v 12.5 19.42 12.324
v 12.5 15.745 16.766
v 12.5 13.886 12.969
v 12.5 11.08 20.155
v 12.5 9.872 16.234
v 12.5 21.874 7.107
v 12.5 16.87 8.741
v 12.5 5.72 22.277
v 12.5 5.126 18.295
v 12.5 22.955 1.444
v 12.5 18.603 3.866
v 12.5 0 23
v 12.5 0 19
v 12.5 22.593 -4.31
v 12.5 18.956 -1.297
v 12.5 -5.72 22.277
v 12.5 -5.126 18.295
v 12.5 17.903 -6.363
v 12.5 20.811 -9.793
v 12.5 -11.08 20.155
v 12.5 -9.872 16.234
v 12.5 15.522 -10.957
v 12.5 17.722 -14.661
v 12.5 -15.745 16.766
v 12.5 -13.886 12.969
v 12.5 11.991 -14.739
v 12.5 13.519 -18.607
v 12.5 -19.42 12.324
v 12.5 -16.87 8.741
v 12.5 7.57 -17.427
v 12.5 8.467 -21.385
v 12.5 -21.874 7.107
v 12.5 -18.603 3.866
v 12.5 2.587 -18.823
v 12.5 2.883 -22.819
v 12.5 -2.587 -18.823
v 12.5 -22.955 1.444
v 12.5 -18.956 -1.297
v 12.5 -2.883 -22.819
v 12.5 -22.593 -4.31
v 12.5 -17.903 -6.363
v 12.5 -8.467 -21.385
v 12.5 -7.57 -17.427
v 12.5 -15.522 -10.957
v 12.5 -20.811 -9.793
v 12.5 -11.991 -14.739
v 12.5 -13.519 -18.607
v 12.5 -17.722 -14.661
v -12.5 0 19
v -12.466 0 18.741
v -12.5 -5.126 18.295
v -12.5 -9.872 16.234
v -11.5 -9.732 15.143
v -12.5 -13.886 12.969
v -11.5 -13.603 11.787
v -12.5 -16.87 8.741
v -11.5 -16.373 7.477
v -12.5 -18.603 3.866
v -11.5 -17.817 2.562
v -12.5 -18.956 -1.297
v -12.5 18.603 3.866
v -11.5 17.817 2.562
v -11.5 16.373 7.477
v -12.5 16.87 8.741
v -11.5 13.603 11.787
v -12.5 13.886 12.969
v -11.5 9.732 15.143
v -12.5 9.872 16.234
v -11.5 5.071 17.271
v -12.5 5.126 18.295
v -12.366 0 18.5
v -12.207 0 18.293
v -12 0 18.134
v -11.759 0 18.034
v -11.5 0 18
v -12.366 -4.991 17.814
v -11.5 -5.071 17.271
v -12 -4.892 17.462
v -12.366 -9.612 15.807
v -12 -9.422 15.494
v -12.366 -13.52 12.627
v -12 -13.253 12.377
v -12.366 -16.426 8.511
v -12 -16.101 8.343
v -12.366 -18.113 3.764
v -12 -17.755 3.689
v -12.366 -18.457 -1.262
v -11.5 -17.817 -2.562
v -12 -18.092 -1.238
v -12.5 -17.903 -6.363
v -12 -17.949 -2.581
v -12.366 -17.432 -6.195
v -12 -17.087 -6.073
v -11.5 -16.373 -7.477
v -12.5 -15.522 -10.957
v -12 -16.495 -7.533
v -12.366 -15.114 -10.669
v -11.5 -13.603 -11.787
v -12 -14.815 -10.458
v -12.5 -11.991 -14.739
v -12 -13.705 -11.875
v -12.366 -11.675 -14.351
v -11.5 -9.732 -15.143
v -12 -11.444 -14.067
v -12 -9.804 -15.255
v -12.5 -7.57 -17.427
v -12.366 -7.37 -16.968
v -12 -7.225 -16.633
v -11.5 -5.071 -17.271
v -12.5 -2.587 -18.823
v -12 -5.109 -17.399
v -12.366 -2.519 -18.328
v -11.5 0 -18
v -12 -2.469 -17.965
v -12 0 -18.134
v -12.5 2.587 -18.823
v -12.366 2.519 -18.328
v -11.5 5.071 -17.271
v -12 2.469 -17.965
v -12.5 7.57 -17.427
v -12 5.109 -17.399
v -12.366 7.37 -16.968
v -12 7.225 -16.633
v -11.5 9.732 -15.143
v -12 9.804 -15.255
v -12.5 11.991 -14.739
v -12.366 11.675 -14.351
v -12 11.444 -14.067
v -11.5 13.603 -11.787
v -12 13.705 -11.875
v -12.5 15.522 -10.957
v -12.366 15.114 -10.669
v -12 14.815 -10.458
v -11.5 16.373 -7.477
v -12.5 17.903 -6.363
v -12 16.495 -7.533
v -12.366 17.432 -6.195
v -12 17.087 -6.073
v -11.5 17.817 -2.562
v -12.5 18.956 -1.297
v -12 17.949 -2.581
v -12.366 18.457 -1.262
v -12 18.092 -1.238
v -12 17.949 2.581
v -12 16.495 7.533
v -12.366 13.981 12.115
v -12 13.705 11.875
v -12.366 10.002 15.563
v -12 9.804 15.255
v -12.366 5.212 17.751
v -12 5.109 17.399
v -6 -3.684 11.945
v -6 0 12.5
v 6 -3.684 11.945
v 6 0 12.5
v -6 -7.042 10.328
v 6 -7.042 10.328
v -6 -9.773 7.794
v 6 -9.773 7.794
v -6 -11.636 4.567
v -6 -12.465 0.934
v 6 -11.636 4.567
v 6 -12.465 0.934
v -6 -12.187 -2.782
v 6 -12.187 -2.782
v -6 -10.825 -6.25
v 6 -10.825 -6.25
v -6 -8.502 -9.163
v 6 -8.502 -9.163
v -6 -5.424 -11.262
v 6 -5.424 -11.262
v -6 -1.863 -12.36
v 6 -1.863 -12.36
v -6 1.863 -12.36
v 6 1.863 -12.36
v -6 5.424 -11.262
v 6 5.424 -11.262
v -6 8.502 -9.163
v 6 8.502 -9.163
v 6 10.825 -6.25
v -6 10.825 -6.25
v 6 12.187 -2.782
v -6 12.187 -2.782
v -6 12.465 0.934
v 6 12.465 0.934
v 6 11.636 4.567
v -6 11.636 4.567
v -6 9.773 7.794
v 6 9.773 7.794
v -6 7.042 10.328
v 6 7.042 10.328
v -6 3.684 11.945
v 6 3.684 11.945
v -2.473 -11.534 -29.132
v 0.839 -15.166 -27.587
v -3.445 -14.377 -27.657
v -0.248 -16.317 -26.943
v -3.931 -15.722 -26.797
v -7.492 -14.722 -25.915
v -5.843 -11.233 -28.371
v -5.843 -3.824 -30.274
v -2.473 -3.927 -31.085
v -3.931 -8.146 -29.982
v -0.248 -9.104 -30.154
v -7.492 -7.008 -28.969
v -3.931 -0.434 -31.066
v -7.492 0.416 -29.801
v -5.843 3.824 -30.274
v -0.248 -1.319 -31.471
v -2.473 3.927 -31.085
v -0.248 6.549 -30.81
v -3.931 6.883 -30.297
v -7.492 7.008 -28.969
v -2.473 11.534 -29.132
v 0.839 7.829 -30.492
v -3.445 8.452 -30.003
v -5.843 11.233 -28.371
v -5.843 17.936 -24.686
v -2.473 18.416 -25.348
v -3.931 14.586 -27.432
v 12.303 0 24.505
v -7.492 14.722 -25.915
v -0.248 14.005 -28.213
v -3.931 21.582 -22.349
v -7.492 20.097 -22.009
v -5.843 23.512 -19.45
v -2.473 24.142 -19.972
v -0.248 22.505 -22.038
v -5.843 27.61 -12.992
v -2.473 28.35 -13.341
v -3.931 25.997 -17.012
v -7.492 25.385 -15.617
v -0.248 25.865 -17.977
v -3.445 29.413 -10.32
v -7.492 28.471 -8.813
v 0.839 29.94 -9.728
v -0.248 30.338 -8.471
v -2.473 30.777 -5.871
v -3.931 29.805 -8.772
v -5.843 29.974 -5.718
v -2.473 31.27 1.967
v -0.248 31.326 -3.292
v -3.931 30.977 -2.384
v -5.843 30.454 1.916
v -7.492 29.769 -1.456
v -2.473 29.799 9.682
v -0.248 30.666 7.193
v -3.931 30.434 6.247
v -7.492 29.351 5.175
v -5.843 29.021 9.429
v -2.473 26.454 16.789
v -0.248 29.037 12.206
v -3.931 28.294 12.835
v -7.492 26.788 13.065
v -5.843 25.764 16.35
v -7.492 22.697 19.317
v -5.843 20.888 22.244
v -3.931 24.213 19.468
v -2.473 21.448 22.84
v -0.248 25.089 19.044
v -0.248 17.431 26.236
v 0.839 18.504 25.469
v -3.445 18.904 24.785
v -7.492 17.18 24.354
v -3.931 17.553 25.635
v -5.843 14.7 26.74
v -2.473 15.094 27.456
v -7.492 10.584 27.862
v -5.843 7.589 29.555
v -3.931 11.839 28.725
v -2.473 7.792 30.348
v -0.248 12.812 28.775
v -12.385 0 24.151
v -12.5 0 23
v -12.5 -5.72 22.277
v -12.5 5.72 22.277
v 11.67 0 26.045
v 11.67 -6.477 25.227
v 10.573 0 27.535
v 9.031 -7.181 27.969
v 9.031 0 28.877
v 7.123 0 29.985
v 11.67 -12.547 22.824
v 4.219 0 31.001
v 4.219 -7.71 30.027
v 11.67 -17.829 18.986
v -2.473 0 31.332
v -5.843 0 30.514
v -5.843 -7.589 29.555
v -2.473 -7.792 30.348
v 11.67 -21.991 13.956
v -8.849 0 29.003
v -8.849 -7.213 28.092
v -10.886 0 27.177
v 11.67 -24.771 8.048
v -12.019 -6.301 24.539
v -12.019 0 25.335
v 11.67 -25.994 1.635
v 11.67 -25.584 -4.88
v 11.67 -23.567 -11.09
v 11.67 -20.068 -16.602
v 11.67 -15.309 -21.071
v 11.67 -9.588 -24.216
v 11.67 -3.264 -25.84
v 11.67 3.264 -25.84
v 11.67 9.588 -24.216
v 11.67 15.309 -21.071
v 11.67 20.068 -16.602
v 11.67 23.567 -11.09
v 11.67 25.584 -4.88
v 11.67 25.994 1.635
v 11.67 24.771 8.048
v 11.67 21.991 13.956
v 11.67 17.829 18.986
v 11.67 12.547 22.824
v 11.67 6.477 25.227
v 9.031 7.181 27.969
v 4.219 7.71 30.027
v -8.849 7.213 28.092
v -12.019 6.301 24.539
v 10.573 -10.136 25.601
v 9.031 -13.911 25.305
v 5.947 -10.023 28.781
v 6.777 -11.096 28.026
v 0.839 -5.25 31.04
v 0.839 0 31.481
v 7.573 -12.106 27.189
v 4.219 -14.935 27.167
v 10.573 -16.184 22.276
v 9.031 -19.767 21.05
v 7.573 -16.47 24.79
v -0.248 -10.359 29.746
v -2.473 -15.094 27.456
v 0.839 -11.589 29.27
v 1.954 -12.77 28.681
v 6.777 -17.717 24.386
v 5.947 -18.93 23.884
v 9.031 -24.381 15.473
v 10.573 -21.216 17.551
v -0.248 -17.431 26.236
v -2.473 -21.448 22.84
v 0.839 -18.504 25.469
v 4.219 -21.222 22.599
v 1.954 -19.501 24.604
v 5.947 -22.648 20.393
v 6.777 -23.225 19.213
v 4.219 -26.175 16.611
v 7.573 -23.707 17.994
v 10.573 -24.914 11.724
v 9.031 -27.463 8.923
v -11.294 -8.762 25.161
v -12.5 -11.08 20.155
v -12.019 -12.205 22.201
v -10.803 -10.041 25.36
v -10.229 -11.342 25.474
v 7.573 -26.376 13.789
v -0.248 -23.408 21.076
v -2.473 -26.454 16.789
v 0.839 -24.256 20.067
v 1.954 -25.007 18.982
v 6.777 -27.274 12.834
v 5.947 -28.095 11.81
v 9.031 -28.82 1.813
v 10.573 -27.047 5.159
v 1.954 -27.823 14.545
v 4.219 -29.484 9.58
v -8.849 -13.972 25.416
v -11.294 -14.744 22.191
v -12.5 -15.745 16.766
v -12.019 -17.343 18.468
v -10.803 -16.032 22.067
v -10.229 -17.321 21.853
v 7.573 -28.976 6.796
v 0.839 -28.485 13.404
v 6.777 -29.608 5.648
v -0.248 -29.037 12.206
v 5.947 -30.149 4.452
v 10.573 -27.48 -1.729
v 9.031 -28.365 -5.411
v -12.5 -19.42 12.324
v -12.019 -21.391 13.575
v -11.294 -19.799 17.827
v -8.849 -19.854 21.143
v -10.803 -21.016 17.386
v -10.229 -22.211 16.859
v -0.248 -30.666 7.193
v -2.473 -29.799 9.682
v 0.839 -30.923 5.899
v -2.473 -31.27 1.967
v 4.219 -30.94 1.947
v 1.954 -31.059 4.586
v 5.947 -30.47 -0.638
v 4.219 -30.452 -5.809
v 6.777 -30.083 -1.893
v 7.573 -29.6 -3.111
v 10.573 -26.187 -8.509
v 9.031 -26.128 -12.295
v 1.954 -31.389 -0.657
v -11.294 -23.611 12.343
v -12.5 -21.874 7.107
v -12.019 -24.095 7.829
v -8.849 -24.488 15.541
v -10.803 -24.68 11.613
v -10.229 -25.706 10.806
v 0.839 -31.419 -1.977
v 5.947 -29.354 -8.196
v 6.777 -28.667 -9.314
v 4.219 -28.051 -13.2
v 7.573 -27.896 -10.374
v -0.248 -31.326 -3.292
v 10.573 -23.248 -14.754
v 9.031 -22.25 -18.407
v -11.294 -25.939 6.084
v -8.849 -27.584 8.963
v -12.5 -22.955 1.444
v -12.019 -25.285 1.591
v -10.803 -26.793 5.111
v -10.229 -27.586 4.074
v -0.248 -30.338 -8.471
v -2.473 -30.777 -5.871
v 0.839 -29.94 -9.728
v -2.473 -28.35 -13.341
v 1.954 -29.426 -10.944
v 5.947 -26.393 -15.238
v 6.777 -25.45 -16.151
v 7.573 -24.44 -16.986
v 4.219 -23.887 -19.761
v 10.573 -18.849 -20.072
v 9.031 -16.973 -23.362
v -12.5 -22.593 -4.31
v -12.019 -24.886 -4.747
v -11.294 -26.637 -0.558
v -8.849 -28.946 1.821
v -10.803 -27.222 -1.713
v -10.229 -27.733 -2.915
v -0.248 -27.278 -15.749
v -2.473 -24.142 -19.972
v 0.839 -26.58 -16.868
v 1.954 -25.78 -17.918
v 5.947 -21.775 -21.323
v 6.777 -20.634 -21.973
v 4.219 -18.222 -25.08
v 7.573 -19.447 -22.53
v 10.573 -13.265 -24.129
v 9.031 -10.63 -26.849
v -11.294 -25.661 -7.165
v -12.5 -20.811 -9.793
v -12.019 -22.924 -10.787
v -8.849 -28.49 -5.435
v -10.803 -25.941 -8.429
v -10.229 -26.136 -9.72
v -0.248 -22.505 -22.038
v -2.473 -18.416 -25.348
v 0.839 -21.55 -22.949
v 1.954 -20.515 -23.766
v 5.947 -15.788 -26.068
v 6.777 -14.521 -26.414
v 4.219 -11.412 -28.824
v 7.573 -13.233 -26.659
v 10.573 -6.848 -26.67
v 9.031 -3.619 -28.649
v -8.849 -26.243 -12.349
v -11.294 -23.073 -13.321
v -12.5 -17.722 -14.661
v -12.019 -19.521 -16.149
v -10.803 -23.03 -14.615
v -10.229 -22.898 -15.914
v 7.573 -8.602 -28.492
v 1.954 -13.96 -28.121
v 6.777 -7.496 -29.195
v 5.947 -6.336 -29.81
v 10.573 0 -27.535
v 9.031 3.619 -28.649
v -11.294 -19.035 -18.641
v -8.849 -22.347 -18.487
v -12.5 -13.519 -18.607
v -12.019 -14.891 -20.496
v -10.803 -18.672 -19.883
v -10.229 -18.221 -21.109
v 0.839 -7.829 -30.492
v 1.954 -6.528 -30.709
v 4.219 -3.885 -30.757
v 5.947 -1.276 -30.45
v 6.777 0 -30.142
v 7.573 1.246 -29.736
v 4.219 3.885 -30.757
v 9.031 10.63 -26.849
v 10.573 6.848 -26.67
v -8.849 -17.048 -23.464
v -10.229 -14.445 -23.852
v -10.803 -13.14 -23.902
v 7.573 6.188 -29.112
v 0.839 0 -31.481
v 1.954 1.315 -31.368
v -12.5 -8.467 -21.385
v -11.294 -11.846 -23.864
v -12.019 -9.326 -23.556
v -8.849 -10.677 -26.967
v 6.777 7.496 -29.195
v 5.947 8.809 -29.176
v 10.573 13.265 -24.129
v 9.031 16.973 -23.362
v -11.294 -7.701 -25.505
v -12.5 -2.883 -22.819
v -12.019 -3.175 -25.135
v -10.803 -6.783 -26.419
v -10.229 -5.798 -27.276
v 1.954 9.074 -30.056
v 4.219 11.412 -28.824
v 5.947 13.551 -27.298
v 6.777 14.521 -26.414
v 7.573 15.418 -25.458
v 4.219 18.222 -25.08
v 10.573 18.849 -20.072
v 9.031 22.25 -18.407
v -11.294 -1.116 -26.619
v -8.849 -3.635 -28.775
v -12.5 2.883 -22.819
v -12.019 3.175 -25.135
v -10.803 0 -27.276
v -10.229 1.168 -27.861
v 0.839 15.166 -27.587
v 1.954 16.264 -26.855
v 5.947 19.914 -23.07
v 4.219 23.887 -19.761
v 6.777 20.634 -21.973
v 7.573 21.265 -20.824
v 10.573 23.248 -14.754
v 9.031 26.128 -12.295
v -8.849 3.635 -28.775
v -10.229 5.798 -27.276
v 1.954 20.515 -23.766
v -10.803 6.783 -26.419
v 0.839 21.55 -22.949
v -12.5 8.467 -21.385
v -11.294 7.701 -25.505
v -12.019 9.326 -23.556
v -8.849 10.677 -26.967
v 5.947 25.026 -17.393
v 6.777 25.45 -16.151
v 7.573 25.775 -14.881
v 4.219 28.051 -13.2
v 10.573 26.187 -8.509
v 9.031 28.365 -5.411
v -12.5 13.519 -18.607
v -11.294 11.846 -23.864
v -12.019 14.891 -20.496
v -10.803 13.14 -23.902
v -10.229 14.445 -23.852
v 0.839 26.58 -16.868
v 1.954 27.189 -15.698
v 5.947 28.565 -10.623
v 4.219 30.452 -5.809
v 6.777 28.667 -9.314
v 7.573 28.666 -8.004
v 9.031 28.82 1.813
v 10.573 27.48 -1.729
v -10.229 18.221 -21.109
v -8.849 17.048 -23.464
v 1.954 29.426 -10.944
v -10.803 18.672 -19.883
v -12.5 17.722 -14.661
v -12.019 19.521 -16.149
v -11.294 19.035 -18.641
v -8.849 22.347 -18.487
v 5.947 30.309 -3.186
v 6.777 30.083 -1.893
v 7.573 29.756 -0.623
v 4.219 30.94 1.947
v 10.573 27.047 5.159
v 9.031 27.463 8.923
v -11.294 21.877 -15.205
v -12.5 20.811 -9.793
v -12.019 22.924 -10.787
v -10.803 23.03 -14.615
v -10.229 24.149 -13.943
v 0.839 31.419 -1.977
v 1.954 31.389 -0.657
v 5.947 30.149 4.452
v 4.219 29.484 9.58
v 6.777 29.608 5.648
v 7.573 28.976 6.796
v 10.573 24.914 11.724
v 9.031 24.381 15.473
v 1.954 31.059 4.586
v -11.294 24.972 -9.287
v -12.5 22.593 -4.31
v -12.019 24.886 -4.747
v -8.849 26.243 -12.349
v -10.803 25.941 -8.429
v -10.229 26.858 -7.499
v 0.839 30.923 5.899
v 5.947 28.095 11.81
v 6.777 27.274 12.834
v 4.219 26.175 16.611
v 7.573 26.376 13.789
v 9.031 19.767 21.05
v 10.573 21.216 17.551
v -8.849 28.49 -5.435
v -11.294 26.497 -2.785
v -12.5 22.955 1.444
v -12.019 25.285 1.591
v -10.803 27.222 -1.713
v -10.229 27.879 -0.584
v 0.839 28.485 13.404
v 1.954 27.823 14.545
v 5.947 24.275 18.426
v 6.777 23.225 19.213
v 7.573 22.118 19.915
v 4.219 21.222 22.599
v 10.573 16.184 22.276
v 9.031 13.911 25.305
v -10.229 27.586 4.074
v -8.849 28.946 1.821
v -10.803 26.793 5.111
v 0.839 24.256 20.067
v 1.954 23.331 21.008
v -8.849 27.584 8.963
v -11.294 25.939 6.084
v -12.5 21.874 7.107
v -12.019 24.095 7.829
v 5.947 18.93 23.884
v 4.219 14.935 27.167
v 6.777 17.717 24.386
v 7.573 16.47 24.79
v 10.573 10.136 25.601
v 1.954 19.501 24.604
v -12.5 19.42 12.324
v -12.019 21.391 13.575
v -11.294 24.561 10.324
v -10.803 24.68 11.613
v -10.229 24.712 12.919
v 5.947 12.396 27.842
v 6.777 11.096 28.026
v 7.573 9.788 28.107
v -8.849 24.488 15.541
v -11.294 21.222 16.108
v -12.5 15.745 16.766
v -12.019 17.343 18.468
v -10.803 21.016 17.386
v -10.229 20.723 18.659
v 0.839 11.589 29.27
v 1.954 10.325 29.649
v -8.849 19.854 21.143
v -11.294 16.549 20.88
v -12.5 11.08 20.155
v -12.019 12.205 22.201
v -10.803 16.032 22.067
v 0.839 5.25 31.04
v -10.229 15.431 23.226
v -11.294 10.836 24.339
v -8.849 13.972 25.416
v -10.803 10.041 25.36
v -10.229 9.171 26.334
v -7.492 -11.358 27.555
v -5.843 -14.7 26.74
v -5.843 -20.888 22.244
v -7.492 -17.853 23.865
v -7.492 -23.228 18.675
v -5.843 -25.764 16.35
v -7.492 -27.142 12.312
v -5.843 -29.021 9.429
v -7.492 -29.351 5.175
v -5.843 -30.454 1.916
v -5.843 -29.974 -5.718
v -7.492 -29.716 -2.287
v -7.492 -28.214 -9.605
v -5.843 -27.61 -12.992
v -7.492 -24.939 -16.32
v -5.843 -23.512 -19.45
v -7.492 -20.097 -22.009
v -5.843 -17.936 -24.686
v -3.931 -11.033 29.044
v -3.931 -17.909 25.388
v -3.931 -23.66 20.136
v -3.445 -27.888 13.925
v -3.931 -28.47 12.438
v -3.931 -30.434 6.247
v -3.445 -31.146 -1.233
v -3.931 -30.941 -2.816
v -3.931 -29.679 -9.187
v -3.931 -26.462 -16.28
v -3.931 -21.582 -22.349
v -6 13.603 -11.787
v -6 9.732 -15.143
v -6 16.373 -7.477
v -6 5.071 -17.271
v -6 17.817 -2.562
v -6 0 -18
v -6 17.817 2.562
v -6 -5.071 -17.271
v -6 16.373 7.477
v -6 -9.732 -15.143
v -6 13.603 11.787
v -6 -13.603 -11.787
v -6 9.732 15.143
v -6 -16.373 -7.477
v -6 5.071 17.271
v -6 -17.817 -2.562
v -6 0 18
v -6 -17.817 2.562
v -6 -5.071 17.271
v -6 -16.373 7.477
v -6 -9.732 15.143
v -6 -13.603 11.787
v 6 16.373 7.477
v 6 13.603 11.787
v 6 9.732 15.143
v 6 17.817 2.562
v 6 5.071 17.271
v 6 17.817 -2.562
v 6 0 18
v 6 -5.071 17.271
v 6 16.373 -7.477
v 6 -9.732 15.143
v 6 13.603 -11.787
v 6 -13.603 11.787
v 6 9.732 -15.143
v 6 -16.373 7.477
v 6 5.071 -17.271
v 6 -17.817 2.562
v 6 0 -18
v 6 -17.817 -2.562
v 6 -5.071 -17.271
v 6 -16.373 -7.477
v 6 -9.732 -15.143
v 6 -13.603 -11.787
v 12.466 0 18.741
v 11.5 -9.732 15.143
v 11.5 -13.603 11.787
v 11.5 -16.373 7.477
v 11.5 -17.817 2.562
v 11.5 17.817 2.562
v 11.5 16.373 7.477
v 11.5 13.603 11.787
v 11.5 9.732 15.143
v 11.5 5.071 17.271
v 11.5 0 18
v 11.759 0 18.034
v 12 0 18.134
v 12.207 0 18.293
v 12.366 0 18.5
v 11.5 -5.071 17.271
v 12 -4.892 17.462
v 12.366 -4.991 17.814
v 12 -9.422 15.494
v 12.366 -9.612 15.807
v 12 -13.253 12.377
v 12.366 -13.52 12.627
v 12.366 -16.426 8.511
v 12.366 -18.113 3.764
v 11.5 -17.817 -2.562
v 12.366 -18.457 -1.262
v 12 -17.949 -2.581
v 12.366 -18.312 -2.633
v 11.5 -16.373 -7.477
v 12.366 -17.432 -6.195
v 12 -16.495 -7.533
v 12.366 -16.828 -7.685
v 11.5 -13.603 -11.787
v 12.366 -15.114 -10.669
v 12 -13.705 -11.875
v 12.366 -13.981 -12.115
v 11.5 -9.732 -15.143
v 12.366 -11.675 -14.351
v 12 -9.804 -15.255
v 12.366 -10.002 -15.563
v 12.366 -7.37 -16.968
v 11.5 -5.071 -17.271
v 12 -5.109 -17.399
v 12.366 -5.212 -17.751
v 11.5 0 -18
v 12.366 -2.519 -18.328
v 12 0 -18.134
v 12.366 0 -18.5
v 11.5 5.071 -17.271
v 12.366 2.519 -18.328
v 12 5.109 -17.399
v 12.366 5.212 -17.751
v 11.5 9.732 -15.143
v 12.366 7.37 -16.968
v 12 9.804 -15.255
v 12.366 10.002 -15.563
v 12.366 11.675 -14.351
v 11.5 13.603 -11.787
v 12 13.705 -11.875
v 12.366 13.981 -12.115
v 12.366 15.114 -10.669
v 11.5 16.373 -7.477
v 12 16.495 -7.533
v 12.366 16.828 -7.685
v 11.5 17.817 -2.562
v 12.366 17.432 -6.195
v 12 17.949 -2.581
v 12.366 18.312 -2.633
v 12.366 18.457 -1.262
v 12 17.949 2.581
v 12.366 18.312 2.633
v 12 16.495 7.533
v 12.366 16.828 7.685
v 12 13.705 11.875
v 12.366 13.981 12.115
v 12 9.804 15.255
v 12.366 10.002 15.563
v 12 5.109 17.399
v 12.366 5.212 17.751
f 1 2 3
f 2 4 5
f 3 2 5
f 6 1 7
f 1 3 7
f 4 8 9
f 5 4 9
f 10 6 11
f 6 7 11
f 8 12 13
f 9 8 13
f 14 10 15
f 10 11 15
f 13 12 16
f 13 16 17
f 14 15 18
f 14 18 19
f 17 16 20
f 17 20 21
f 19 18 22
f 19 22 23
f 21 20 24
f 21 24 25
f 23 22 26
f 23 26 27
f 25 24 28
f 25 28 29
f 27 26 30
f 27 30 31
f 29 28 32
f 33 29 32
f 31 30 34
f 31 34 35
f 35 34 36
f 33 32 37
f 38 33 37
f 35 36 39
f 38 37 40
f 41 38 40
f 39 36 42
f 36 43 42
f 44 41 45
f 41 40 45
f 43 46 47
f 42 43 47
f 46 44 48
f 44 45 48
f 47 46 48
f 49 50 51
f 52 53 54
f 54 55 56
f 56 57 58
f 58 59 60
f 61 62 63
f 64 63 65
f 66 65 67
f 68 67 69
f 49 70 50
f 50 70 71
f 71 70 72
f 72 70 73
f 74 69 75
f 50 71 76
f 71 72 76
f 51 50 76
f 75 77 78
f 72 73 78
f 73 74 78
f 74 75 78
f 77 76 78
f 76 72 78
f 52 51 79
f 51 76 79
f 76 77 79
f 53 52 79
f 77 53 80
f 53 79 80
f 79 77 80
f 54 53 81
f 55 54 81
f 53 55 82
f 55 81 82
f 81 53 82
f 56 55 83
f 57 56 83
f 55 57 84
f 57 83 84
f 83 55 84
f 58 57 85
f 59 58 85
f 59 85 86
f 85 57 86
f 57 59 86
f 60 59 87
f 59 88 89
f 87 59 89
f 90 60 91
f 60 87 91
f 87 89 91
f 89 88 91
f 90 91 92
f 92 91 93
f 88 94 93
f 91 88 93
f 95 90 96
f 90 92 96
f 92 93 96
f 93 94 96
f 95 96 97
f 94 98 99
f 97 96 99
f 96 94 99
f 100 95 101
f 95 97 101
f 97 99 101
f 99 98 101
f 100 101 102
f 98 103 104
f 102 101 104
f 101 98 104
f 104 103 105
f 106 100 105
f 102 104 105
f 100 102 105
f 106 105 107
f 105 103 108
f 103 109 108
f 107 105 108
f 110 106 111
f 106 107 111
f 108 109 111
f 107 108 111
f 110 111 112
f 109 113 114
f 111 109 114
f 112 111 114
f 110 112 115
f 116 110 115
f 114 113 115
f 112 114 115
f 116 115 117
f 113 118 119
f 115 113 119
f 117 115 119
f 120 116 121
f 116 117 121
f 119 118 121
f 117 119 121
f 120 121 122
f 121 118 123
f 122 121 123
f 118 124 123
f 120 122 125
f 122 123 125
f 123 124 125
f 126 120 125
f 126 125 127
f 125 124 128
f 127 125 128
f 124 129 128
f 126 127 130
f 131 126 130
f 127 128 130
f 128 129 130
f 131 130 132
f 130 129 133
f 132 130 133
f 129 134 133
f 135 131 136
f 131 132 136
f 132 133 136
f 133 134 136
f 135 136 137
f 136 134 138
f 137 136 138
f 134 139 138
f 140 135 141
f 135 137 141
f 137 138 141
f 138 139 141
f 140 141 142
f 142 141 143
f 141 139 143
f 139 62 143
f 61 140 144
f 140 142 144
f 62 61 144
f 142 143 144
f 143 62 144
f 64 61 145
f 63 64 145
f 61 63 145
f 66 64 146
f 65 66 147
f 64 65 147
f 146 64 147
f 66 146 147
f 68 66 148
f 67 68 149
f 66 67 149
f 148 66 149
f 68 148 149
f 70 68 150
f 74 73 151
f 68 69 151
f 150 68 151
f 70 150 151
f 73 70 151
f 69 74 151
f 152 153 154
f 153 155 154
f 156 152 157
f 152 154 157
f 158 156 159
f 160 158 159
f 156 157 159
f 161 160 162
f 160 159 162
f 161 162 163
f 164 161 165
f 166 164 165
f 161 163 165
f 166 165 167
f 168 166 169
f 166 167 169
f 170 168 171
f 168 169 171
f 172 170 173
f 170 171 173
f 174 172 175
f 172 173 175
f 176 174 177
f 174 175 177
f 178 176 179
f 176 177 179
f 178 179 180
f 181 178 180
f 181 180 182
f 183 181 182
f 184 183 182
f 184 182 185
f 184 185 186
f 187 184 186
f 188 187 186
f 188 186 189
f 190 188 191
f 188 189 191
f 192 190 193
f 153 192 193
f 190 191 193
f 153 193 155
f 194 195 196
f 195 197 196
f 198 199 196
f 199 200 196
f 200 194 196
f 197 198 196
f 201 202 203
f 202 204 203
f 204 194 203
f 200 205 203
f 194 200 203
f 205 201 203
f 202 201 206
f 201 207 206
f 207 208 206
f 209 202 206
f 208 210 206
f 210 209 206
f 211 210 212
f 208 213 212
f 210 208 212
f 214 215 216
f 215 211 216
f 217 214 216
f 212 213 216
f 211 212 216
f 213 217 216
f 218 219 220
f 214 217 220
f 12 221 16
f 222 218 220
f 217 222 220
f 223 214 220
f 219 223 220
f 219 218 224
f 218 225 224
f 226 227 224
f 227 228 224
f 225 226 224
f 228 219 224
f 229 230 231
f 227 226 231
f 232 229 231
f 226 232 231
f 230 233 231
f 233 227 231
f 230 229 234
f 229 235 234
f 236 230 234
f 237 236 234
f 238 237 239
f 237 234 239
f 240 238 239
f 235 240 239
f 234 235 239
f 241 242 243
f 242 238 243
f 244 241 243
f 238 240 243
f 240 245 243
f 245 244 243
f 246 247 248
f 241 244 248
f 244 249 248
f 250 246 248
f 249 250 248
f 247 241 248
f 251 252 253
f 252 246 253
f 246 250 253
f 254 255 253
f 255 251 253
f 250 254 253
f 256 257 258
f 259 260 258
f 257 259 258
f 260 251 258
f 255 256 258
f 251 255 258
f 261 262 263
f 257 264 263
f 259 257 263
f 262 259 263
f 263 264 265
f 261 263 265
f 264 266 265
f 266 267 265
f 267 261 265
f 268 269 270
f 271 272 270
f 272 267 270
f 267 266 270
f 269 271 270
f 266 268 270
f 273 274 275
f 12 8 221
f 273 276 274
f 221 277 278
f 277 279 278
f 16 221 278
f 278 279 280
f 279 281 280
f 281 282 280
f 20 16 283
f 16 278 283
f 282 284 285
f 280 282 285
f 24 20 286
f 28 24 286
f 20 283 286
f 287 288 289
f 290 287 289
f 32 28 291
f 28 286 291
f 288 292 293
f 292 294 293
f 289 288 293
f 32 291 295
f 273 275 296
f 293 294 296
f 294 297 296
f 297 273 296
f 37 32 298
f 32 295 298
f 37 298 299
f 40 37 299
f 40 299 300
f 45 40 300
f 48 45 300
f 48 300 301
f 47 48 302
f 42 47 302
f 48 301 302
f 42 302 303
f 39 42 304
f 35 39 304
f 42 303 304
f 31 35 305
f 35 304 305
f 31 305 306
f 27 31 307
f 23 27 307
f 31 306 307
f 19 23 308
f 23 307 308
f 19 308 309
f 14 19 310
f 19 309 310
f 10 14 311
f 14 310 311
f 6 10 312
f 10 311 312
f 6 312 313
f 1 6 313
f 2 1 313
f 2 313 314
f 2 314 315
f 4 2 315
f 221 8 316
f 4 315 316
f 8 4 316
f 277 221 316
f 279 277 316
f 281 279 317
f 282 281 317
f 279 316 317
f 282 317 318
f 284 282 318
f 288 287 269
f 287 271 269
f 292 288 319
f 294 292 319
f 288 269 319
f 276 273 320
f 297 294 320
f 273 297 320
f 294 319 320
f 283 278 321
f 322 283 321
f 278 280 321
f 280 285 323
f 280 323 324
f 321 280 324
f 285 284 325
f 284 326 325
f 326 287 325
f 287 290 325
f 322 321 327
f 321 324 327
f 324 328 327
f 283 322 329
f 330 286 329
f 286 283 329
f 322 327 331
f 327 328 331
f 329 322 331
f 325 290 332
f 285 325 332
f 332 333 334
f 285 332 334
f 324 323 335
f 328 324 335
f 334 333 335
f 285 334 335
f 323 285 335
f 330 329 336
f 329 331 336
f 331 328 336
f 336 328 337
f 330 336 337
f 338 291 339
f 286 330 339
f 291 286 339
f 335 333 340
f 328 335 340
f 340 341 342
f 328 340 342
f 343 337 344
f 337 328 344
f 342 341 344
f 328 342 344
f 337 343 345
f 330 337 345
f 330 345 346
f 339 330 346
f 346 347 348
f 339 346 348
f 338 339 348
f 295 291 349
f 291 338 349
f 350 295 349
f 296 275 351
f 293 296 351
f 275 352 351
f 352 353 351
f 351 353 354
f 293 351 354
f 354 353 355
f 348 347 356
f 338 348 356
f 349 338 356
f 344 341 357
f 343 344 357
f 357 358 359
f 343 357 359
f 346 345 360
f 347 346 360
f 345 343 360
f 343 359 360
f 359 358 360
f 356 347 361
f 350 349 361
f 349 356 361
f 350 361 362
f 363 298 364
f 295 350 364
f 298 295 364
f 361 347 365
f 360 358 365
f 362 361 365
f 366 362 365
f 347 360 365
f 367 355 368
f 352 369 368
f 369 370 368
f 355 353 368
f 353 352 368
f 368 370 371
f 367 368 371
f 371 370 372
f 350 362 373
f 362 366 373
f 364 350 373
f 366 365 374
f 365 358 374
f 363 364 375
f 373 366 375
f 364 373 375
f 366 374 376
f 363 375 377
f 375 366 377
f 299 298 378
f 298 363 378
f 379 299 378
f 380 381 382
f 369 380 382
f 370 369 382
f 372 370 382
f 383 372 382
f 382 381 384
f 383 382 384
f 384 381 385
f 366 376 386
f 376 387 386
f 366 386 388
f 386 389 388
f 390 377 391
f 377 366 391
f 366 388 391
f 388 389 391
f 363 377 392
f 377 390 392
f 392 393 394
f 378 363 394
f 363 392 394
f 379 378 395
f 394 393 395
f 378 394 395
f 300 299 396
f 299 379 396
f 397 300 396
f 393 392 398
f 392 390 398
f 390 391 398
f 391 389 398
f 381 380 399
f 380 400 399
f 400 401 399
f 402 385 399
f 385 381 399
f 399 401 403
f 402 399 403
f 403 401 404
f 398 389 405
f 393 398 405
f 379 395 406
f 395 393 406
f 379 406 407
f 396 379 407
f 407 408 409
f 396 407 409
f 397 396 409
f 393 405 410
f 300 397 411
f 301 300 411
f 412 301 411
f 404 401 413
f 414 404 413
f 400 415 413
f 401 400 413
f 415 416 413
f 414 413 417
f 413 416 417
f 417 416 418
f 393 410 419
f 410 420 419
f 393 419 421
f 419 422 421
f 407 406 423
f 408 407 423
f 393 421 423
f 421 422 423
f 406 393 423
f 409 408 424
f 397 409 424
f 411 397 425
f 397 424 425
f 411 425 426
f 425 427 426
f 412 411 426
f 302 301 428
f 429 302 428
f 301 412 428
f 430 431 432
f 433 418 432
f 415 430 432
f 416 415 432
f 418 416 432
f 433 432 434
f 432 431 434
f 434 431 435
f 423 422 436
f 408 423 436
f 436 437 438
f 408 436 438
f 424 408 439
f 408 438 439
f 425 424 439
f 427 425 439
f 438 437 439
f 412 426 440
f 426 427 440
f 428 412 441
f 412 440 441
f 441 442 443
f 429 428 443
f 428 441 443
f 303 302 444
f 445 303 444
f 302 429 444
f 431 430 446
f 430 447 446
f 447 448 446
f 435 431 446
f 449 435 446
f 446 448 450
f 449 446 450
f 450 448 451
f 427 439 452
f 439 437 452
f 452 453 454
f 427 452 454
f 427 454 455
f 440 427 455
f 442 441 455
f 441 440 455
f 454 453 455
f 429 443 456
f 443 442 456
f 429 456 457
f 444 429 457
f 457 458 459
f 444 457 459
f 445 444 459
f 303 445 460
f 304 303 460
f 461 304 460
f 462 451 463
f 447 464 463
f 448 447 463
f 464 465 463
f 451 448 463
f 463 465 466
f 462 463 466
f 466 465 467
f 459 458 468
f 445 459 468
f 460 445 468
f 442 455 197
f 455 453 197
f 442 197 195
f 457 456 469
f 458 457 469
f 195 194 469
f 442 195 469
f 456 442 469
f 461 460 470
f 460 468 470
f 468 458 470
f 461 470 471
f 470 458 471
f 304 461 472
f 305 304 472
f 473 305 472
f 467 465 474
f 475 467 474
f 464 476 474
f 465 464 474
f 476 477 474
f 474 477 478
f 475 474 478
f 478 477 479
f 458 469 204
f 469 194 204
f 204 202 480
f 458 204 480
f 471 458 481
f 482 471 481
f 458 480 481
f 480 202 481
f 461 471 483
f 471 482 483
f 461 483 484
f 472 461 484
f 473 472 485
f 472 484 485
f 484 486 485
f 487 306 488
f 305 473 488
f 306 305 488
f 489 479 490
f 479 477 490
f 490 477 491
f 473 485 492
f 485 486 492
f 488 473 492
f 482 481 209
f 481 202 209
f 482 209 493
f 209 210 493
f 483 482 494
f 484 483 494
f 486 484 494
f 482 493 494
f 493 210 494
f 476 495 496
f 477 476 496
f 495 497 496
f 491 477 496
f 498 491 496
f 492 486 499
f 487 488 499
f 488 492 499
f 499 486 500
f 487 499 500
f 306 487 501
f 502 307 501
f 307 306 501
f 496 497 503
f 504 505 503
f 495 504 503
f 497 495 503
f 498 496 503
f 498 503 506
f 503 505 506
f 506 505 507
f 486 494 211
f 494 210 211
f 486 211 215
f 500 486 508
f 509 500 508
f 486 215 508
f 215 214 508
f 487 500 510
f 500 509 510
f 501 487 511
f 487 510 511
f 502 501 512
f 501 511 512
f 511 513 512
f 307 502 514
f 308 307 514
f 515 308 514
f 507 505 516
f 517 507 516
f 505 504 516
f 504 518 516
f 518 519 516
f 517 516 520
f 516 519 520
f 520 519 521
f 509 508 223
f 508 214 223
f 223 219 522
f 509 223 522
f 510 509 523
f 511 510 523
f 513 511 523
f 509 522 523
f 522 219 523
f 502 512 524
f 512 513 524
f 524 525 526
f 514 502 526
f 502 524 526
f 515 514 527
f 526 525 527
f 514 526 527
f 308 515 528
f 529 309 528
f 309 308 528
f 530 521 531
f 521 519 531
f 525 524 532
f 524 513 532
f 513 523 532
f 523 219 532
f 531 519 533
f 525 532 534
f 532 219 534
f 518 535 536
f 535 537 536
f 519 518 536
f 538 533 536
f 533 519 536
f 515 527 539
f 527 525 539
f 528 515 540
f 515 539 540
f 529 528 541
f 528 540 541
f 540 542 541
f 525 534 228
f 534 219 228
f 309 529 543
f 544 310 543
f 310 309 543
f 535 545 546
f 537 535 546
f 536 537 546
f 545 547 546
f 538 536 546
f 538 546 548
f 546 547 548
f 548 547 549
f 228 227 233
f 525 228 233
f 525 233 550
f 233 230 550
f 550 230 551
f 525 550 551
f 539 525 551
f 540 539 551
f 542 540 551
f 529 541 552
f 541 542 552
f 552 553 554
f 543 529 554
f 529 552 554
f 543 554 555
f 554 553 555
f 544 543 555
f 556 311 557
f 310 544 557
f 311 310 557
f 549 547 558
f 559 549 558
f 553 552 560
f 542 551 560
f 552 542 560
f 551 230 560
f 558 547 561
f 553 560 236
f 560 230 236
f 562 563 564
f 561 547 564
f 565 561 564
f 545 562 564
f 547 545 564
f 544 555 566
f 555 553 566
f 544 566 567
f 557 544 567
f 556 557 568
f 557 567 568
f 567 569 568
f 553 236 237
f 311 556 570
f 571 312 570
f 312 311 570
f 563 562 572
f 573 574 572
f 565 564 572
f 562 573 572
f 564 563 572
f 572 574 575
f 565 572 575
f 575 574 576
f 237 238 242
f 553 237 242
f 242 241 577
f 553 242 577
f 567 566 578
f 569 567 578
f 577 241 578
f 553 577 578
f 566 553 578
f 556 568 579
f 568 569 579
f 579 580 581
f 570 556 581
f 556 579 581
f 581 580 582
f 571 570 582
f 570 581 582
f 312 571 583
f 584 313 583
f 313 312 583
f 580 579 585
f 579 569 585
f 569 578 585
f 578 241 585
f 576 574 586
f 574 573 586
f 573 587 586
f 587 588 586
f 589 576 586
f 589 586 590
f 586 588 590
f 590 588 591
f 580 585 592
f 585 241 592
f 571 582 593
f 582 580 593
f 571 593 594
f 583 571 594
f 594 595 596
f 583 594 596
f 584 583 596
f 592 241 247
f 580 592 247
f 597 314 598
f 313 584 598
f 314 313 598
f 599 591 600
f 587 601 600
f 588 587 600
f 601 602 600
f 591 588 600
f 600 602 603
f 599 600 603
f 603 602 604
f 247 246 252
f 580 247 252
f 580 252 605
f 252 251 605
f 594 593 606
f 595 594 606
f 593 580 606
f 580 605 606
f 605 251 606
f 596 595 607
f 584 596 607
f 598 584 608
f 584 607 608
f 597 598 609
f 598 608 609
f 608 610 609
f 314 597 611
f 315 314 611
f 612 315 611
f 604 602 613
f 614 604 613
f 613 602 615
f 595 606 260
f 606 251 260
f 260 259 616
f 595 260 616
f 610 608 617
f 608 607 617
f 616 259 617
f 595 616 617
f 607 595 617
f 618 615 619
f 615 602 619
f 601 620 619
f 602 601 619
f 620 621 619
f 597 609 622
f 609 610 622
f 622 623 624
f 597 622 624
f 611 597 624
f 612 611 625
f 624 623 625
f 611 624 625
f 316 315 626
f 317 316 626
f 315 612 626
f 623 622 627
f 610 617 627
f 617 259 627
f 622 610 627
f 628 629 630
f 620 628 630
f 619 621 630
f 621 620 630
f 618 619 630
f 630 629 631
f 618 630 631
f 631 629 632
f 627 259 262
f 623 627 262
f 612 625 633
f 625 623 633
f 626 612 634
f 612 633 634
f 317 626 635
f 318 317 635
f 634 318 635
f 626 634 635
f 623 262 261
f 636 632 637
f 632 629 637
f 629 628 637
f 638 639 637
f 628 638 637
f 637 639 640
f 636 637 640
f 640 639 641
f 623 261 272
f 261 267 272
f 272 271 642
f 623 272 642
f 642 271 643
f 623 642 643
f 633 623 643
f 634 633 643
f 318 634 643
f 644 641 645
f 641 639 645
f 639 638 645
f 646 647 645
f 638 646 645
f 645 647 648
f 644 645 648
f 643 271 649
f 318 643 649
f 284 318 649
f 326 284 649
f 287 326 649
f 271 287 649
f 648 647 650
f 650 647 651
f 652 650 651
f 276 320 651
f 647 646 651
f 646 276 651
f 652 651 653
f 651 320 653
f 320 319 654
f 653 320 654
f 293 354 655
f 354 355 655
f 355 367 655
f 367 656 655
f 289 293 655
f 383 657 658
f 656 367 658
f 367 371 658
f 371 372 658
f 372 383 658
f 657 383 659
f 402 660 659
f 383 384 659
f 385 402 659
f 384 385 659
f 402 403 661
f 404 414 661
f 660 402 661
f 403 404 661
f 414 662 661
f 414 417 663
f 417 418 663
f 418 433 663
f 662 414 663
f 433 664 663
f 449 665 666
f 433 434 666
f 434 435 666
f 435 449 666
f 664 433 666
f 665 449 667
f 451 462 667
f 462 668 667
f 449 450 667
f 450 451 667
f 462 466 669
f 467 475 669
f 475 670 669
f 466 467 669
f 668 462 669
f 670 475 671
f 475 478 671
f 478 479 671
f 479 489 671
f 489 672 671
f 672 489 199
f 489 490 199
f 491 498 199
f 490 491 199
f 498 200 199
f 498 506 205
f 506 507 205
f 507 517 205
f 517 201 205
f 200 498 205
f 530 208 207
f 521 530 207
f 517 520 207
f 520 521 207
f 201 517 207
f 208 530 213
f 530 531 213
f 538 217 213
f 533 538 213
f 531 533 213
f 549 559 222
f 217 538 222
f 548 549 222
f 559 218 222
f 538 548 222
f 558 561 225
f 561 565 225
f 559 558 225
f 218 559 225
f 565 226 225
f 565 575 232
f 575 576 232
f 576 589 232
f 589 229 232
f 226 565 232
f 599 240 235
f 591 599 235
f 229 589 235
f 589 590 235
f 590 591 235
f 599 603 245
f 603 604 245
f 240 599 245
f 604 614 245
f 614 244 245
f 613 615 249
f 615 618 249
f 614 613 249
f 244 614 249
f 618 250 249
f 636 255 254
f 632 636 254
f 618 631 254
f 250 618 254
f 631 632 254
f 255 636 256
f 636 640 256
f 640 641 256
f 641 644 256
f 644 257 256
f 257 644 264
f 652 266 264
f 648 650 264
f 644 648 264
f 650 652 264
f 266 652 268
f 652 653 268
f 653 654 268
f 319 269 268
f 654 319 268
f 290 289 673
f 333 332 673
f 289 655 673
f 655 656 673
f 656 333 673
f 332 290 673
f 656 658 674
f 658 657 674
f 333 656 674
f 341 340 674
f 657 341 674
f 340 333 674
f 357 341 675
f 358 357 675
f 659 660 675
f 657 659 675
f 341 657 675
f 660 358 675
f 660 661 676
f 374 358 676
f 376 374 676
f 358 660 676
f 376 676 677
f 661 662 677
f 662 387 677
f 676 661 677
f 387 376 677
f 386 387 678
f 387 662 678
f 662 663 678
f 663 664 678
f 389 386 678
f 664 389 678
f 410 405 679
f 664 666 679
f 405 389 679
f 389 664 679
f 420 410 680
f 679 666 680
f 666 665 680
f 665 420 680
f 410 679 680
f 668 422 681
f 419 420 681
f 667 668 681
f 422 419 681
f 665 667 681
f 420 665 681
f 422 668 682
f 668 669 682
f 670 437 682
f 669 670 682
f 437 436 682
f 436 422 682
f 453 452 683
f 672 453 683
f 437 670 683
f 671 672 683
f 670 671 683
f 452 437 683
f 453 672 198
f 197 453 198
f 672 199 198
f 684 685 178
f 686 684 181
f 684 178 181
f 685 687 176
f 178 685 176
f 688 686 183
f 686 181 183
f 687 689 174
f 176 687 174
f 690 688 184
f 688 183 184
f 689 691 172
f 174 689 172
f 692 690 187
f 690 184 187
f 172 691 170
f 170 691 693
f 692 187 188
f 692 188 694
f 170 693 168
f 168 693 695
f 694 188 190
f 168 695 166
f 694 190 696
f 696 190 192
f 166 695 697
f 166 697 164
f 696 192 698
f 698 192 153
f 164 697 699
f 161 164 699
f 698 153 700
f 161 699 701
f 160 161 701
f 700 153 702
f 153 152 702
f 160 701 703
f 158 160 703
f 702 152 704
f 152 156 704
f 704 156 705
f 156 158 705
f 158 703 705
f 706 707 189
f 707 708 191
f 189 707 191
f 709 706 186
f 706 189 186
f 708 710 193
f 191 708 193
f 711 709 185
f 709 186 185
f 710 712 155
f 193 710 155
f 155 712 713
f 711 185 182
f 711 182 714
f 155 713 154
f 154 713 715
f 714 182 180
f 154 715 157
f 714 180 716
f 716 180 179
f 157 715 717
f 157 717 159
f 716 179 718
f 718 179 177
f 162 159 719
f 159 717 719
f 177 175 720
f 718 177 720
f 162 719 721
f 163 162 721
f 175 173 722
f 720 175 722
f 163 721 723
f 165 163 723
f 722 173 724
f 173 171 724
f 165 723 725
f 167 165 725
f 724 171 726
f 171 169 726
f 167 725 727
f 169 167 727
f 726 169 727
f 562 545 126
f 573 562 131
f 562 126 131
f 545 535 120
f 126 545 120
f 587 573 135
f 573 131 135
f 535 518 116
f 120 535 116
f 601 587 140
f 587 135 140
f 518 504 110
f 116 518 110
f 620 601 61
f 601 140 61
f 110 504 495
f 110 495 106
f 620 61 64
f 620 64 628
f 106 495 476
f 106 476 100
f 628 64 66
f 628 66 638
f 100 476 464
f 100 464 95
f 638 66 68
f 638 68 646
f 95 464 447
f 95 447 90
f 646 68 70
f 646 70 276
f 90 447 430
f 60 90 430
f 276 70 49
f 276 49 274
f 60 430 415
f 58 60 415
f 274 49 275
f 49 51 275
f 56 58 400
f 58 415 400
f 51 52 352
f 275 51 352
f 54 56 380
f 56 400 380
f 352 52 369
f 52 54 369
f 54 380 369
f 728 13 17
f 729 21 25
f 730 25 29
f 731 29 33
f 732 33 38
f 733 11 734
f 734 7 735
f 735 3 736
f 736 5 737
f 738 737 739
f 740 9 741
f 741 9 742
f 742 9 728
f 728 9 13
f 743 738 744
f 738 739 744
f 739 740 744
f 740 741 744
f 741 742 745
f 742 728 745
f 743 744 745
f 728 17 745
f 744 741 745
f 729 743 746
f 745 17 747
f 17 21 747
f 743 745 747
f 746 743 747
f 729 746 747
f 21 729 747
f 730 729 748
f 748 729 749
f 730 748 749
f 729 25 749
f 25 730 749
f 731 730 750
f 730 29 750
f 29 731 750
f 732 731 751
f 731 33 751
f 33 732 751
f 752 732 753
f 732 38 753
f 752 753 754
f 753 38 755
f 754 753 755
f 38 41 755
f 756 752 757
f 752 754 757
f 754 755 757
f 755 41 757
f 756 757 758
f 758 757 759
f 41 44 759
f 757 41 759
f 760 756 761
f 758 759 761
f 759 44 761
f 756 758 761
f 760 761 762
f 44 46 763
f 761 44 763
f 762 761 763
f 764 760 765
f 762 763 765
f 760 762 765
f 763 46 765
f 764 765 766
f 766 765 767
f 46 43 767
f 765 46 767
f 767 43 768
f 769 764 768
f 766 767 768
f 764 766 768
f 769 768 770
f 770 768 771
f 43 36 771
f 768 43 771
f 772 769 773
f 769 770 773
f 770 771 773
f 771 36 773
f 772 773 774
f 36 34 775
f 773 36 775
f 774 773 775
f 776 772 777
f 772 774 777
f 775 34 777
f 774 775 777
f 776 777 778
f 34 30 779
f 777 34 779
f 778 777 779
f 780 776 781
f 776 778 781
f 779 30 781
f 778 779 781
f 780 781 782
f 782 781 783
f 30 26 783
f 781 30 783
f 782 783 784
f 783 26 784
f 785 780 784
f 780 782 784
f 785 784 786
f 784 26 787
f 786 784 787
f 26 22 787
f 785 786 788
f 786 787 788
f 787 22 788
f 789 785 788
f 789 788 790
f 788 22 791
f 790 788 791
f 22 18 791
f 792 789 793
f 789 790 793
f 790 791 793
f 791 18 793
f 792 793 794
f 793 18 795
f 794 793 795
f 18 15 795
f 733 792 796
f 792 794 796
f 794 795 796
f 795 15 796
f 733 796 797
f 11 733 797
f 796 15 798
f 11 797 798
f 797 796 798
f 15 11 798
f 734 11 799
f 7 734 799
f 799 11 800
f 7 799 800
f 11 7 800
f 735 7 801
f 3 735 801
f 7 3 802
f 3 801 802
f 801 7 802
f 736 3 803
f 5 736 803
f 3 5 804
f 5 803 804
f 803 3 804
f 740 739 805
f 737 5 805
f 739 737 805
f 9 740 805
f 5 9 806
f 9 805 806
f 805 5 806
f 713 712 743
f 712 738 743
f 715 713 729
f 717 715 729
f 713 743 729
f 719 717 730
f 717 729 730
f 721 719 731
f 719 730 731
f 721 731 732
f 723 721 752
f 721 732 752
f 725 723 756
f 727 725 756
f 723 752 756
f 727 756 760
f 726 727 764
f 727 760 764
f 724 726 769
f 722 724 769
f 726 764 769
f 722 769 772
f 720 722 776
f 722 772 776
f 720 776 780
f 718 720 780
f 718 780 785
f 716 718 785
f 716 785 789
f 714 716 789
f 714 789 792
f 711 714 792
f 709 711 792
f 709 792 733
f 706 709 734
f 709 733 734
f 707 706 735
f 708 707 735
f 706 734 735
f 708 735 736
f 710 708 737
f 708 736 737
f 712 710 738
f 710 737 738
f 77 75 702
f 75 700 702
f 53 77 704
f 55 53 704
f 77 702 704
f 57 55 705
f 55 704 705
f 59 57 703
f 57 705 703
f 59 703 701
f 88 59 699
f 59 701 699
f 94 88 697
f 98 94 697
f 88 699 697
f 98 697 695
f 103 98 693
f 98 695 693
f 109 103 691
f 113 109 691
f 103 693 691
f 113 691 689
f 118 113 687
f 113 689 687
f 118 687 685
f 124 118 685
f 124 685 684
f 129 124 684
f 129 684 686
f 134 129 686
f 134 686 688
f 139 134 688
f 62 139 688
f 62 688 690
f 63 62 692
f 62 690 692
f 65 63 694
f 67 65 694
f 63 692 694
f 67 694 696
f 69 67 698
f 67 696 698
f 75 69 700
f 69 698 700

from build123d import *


with BuildPart() as part:
    # Szkic1 → Obrót1 (revolve)
    with BuildSketch(Plane.XY, mode=Mode.PRIVATE) as obr_t1_sk:
        with BuildLine():
            Line((-6, 12.5), (6, 12.5))
            Line((6, 12.5), (6, 18))
            Line((6, 18), (11.5, 18))
            ThreePointArc((11.5, 18), (12.207106781, 18.292893219), (12.5, 19))
            Line((12.5, 19), (12.5, 23))
            add(Edge.make_bspline(
                [(12.5, 23), (12.5, 31.5), (0, 31.5), (-12.5, 31.5), (-12.5, 23)],
                knots=[0, 0, 0, 1.570796327, 1.570796327, 3.141592654, 3.141592654, 3.141592654], degree=2, weights=[1, 0.707106781, 1, 0.707106781, 1]))
            Line((-12.5, 23), (-12.5, 19))
            ThreePointArc((-12.5, 19), (-12.207106781, 18.292893219), (-11.5, 18))
            Line((-11.5, 18), (-6, 18))
            Line((-6, 18), (-6, 12.5))
        make_face()
    revolve(obr_t1_sk.sketch.rotate(Axis((0, 0, 0), (1, 0, 0)), 90), axis=Axis((0, 0, 0), (1, 0, 0)))


solid = part.part
